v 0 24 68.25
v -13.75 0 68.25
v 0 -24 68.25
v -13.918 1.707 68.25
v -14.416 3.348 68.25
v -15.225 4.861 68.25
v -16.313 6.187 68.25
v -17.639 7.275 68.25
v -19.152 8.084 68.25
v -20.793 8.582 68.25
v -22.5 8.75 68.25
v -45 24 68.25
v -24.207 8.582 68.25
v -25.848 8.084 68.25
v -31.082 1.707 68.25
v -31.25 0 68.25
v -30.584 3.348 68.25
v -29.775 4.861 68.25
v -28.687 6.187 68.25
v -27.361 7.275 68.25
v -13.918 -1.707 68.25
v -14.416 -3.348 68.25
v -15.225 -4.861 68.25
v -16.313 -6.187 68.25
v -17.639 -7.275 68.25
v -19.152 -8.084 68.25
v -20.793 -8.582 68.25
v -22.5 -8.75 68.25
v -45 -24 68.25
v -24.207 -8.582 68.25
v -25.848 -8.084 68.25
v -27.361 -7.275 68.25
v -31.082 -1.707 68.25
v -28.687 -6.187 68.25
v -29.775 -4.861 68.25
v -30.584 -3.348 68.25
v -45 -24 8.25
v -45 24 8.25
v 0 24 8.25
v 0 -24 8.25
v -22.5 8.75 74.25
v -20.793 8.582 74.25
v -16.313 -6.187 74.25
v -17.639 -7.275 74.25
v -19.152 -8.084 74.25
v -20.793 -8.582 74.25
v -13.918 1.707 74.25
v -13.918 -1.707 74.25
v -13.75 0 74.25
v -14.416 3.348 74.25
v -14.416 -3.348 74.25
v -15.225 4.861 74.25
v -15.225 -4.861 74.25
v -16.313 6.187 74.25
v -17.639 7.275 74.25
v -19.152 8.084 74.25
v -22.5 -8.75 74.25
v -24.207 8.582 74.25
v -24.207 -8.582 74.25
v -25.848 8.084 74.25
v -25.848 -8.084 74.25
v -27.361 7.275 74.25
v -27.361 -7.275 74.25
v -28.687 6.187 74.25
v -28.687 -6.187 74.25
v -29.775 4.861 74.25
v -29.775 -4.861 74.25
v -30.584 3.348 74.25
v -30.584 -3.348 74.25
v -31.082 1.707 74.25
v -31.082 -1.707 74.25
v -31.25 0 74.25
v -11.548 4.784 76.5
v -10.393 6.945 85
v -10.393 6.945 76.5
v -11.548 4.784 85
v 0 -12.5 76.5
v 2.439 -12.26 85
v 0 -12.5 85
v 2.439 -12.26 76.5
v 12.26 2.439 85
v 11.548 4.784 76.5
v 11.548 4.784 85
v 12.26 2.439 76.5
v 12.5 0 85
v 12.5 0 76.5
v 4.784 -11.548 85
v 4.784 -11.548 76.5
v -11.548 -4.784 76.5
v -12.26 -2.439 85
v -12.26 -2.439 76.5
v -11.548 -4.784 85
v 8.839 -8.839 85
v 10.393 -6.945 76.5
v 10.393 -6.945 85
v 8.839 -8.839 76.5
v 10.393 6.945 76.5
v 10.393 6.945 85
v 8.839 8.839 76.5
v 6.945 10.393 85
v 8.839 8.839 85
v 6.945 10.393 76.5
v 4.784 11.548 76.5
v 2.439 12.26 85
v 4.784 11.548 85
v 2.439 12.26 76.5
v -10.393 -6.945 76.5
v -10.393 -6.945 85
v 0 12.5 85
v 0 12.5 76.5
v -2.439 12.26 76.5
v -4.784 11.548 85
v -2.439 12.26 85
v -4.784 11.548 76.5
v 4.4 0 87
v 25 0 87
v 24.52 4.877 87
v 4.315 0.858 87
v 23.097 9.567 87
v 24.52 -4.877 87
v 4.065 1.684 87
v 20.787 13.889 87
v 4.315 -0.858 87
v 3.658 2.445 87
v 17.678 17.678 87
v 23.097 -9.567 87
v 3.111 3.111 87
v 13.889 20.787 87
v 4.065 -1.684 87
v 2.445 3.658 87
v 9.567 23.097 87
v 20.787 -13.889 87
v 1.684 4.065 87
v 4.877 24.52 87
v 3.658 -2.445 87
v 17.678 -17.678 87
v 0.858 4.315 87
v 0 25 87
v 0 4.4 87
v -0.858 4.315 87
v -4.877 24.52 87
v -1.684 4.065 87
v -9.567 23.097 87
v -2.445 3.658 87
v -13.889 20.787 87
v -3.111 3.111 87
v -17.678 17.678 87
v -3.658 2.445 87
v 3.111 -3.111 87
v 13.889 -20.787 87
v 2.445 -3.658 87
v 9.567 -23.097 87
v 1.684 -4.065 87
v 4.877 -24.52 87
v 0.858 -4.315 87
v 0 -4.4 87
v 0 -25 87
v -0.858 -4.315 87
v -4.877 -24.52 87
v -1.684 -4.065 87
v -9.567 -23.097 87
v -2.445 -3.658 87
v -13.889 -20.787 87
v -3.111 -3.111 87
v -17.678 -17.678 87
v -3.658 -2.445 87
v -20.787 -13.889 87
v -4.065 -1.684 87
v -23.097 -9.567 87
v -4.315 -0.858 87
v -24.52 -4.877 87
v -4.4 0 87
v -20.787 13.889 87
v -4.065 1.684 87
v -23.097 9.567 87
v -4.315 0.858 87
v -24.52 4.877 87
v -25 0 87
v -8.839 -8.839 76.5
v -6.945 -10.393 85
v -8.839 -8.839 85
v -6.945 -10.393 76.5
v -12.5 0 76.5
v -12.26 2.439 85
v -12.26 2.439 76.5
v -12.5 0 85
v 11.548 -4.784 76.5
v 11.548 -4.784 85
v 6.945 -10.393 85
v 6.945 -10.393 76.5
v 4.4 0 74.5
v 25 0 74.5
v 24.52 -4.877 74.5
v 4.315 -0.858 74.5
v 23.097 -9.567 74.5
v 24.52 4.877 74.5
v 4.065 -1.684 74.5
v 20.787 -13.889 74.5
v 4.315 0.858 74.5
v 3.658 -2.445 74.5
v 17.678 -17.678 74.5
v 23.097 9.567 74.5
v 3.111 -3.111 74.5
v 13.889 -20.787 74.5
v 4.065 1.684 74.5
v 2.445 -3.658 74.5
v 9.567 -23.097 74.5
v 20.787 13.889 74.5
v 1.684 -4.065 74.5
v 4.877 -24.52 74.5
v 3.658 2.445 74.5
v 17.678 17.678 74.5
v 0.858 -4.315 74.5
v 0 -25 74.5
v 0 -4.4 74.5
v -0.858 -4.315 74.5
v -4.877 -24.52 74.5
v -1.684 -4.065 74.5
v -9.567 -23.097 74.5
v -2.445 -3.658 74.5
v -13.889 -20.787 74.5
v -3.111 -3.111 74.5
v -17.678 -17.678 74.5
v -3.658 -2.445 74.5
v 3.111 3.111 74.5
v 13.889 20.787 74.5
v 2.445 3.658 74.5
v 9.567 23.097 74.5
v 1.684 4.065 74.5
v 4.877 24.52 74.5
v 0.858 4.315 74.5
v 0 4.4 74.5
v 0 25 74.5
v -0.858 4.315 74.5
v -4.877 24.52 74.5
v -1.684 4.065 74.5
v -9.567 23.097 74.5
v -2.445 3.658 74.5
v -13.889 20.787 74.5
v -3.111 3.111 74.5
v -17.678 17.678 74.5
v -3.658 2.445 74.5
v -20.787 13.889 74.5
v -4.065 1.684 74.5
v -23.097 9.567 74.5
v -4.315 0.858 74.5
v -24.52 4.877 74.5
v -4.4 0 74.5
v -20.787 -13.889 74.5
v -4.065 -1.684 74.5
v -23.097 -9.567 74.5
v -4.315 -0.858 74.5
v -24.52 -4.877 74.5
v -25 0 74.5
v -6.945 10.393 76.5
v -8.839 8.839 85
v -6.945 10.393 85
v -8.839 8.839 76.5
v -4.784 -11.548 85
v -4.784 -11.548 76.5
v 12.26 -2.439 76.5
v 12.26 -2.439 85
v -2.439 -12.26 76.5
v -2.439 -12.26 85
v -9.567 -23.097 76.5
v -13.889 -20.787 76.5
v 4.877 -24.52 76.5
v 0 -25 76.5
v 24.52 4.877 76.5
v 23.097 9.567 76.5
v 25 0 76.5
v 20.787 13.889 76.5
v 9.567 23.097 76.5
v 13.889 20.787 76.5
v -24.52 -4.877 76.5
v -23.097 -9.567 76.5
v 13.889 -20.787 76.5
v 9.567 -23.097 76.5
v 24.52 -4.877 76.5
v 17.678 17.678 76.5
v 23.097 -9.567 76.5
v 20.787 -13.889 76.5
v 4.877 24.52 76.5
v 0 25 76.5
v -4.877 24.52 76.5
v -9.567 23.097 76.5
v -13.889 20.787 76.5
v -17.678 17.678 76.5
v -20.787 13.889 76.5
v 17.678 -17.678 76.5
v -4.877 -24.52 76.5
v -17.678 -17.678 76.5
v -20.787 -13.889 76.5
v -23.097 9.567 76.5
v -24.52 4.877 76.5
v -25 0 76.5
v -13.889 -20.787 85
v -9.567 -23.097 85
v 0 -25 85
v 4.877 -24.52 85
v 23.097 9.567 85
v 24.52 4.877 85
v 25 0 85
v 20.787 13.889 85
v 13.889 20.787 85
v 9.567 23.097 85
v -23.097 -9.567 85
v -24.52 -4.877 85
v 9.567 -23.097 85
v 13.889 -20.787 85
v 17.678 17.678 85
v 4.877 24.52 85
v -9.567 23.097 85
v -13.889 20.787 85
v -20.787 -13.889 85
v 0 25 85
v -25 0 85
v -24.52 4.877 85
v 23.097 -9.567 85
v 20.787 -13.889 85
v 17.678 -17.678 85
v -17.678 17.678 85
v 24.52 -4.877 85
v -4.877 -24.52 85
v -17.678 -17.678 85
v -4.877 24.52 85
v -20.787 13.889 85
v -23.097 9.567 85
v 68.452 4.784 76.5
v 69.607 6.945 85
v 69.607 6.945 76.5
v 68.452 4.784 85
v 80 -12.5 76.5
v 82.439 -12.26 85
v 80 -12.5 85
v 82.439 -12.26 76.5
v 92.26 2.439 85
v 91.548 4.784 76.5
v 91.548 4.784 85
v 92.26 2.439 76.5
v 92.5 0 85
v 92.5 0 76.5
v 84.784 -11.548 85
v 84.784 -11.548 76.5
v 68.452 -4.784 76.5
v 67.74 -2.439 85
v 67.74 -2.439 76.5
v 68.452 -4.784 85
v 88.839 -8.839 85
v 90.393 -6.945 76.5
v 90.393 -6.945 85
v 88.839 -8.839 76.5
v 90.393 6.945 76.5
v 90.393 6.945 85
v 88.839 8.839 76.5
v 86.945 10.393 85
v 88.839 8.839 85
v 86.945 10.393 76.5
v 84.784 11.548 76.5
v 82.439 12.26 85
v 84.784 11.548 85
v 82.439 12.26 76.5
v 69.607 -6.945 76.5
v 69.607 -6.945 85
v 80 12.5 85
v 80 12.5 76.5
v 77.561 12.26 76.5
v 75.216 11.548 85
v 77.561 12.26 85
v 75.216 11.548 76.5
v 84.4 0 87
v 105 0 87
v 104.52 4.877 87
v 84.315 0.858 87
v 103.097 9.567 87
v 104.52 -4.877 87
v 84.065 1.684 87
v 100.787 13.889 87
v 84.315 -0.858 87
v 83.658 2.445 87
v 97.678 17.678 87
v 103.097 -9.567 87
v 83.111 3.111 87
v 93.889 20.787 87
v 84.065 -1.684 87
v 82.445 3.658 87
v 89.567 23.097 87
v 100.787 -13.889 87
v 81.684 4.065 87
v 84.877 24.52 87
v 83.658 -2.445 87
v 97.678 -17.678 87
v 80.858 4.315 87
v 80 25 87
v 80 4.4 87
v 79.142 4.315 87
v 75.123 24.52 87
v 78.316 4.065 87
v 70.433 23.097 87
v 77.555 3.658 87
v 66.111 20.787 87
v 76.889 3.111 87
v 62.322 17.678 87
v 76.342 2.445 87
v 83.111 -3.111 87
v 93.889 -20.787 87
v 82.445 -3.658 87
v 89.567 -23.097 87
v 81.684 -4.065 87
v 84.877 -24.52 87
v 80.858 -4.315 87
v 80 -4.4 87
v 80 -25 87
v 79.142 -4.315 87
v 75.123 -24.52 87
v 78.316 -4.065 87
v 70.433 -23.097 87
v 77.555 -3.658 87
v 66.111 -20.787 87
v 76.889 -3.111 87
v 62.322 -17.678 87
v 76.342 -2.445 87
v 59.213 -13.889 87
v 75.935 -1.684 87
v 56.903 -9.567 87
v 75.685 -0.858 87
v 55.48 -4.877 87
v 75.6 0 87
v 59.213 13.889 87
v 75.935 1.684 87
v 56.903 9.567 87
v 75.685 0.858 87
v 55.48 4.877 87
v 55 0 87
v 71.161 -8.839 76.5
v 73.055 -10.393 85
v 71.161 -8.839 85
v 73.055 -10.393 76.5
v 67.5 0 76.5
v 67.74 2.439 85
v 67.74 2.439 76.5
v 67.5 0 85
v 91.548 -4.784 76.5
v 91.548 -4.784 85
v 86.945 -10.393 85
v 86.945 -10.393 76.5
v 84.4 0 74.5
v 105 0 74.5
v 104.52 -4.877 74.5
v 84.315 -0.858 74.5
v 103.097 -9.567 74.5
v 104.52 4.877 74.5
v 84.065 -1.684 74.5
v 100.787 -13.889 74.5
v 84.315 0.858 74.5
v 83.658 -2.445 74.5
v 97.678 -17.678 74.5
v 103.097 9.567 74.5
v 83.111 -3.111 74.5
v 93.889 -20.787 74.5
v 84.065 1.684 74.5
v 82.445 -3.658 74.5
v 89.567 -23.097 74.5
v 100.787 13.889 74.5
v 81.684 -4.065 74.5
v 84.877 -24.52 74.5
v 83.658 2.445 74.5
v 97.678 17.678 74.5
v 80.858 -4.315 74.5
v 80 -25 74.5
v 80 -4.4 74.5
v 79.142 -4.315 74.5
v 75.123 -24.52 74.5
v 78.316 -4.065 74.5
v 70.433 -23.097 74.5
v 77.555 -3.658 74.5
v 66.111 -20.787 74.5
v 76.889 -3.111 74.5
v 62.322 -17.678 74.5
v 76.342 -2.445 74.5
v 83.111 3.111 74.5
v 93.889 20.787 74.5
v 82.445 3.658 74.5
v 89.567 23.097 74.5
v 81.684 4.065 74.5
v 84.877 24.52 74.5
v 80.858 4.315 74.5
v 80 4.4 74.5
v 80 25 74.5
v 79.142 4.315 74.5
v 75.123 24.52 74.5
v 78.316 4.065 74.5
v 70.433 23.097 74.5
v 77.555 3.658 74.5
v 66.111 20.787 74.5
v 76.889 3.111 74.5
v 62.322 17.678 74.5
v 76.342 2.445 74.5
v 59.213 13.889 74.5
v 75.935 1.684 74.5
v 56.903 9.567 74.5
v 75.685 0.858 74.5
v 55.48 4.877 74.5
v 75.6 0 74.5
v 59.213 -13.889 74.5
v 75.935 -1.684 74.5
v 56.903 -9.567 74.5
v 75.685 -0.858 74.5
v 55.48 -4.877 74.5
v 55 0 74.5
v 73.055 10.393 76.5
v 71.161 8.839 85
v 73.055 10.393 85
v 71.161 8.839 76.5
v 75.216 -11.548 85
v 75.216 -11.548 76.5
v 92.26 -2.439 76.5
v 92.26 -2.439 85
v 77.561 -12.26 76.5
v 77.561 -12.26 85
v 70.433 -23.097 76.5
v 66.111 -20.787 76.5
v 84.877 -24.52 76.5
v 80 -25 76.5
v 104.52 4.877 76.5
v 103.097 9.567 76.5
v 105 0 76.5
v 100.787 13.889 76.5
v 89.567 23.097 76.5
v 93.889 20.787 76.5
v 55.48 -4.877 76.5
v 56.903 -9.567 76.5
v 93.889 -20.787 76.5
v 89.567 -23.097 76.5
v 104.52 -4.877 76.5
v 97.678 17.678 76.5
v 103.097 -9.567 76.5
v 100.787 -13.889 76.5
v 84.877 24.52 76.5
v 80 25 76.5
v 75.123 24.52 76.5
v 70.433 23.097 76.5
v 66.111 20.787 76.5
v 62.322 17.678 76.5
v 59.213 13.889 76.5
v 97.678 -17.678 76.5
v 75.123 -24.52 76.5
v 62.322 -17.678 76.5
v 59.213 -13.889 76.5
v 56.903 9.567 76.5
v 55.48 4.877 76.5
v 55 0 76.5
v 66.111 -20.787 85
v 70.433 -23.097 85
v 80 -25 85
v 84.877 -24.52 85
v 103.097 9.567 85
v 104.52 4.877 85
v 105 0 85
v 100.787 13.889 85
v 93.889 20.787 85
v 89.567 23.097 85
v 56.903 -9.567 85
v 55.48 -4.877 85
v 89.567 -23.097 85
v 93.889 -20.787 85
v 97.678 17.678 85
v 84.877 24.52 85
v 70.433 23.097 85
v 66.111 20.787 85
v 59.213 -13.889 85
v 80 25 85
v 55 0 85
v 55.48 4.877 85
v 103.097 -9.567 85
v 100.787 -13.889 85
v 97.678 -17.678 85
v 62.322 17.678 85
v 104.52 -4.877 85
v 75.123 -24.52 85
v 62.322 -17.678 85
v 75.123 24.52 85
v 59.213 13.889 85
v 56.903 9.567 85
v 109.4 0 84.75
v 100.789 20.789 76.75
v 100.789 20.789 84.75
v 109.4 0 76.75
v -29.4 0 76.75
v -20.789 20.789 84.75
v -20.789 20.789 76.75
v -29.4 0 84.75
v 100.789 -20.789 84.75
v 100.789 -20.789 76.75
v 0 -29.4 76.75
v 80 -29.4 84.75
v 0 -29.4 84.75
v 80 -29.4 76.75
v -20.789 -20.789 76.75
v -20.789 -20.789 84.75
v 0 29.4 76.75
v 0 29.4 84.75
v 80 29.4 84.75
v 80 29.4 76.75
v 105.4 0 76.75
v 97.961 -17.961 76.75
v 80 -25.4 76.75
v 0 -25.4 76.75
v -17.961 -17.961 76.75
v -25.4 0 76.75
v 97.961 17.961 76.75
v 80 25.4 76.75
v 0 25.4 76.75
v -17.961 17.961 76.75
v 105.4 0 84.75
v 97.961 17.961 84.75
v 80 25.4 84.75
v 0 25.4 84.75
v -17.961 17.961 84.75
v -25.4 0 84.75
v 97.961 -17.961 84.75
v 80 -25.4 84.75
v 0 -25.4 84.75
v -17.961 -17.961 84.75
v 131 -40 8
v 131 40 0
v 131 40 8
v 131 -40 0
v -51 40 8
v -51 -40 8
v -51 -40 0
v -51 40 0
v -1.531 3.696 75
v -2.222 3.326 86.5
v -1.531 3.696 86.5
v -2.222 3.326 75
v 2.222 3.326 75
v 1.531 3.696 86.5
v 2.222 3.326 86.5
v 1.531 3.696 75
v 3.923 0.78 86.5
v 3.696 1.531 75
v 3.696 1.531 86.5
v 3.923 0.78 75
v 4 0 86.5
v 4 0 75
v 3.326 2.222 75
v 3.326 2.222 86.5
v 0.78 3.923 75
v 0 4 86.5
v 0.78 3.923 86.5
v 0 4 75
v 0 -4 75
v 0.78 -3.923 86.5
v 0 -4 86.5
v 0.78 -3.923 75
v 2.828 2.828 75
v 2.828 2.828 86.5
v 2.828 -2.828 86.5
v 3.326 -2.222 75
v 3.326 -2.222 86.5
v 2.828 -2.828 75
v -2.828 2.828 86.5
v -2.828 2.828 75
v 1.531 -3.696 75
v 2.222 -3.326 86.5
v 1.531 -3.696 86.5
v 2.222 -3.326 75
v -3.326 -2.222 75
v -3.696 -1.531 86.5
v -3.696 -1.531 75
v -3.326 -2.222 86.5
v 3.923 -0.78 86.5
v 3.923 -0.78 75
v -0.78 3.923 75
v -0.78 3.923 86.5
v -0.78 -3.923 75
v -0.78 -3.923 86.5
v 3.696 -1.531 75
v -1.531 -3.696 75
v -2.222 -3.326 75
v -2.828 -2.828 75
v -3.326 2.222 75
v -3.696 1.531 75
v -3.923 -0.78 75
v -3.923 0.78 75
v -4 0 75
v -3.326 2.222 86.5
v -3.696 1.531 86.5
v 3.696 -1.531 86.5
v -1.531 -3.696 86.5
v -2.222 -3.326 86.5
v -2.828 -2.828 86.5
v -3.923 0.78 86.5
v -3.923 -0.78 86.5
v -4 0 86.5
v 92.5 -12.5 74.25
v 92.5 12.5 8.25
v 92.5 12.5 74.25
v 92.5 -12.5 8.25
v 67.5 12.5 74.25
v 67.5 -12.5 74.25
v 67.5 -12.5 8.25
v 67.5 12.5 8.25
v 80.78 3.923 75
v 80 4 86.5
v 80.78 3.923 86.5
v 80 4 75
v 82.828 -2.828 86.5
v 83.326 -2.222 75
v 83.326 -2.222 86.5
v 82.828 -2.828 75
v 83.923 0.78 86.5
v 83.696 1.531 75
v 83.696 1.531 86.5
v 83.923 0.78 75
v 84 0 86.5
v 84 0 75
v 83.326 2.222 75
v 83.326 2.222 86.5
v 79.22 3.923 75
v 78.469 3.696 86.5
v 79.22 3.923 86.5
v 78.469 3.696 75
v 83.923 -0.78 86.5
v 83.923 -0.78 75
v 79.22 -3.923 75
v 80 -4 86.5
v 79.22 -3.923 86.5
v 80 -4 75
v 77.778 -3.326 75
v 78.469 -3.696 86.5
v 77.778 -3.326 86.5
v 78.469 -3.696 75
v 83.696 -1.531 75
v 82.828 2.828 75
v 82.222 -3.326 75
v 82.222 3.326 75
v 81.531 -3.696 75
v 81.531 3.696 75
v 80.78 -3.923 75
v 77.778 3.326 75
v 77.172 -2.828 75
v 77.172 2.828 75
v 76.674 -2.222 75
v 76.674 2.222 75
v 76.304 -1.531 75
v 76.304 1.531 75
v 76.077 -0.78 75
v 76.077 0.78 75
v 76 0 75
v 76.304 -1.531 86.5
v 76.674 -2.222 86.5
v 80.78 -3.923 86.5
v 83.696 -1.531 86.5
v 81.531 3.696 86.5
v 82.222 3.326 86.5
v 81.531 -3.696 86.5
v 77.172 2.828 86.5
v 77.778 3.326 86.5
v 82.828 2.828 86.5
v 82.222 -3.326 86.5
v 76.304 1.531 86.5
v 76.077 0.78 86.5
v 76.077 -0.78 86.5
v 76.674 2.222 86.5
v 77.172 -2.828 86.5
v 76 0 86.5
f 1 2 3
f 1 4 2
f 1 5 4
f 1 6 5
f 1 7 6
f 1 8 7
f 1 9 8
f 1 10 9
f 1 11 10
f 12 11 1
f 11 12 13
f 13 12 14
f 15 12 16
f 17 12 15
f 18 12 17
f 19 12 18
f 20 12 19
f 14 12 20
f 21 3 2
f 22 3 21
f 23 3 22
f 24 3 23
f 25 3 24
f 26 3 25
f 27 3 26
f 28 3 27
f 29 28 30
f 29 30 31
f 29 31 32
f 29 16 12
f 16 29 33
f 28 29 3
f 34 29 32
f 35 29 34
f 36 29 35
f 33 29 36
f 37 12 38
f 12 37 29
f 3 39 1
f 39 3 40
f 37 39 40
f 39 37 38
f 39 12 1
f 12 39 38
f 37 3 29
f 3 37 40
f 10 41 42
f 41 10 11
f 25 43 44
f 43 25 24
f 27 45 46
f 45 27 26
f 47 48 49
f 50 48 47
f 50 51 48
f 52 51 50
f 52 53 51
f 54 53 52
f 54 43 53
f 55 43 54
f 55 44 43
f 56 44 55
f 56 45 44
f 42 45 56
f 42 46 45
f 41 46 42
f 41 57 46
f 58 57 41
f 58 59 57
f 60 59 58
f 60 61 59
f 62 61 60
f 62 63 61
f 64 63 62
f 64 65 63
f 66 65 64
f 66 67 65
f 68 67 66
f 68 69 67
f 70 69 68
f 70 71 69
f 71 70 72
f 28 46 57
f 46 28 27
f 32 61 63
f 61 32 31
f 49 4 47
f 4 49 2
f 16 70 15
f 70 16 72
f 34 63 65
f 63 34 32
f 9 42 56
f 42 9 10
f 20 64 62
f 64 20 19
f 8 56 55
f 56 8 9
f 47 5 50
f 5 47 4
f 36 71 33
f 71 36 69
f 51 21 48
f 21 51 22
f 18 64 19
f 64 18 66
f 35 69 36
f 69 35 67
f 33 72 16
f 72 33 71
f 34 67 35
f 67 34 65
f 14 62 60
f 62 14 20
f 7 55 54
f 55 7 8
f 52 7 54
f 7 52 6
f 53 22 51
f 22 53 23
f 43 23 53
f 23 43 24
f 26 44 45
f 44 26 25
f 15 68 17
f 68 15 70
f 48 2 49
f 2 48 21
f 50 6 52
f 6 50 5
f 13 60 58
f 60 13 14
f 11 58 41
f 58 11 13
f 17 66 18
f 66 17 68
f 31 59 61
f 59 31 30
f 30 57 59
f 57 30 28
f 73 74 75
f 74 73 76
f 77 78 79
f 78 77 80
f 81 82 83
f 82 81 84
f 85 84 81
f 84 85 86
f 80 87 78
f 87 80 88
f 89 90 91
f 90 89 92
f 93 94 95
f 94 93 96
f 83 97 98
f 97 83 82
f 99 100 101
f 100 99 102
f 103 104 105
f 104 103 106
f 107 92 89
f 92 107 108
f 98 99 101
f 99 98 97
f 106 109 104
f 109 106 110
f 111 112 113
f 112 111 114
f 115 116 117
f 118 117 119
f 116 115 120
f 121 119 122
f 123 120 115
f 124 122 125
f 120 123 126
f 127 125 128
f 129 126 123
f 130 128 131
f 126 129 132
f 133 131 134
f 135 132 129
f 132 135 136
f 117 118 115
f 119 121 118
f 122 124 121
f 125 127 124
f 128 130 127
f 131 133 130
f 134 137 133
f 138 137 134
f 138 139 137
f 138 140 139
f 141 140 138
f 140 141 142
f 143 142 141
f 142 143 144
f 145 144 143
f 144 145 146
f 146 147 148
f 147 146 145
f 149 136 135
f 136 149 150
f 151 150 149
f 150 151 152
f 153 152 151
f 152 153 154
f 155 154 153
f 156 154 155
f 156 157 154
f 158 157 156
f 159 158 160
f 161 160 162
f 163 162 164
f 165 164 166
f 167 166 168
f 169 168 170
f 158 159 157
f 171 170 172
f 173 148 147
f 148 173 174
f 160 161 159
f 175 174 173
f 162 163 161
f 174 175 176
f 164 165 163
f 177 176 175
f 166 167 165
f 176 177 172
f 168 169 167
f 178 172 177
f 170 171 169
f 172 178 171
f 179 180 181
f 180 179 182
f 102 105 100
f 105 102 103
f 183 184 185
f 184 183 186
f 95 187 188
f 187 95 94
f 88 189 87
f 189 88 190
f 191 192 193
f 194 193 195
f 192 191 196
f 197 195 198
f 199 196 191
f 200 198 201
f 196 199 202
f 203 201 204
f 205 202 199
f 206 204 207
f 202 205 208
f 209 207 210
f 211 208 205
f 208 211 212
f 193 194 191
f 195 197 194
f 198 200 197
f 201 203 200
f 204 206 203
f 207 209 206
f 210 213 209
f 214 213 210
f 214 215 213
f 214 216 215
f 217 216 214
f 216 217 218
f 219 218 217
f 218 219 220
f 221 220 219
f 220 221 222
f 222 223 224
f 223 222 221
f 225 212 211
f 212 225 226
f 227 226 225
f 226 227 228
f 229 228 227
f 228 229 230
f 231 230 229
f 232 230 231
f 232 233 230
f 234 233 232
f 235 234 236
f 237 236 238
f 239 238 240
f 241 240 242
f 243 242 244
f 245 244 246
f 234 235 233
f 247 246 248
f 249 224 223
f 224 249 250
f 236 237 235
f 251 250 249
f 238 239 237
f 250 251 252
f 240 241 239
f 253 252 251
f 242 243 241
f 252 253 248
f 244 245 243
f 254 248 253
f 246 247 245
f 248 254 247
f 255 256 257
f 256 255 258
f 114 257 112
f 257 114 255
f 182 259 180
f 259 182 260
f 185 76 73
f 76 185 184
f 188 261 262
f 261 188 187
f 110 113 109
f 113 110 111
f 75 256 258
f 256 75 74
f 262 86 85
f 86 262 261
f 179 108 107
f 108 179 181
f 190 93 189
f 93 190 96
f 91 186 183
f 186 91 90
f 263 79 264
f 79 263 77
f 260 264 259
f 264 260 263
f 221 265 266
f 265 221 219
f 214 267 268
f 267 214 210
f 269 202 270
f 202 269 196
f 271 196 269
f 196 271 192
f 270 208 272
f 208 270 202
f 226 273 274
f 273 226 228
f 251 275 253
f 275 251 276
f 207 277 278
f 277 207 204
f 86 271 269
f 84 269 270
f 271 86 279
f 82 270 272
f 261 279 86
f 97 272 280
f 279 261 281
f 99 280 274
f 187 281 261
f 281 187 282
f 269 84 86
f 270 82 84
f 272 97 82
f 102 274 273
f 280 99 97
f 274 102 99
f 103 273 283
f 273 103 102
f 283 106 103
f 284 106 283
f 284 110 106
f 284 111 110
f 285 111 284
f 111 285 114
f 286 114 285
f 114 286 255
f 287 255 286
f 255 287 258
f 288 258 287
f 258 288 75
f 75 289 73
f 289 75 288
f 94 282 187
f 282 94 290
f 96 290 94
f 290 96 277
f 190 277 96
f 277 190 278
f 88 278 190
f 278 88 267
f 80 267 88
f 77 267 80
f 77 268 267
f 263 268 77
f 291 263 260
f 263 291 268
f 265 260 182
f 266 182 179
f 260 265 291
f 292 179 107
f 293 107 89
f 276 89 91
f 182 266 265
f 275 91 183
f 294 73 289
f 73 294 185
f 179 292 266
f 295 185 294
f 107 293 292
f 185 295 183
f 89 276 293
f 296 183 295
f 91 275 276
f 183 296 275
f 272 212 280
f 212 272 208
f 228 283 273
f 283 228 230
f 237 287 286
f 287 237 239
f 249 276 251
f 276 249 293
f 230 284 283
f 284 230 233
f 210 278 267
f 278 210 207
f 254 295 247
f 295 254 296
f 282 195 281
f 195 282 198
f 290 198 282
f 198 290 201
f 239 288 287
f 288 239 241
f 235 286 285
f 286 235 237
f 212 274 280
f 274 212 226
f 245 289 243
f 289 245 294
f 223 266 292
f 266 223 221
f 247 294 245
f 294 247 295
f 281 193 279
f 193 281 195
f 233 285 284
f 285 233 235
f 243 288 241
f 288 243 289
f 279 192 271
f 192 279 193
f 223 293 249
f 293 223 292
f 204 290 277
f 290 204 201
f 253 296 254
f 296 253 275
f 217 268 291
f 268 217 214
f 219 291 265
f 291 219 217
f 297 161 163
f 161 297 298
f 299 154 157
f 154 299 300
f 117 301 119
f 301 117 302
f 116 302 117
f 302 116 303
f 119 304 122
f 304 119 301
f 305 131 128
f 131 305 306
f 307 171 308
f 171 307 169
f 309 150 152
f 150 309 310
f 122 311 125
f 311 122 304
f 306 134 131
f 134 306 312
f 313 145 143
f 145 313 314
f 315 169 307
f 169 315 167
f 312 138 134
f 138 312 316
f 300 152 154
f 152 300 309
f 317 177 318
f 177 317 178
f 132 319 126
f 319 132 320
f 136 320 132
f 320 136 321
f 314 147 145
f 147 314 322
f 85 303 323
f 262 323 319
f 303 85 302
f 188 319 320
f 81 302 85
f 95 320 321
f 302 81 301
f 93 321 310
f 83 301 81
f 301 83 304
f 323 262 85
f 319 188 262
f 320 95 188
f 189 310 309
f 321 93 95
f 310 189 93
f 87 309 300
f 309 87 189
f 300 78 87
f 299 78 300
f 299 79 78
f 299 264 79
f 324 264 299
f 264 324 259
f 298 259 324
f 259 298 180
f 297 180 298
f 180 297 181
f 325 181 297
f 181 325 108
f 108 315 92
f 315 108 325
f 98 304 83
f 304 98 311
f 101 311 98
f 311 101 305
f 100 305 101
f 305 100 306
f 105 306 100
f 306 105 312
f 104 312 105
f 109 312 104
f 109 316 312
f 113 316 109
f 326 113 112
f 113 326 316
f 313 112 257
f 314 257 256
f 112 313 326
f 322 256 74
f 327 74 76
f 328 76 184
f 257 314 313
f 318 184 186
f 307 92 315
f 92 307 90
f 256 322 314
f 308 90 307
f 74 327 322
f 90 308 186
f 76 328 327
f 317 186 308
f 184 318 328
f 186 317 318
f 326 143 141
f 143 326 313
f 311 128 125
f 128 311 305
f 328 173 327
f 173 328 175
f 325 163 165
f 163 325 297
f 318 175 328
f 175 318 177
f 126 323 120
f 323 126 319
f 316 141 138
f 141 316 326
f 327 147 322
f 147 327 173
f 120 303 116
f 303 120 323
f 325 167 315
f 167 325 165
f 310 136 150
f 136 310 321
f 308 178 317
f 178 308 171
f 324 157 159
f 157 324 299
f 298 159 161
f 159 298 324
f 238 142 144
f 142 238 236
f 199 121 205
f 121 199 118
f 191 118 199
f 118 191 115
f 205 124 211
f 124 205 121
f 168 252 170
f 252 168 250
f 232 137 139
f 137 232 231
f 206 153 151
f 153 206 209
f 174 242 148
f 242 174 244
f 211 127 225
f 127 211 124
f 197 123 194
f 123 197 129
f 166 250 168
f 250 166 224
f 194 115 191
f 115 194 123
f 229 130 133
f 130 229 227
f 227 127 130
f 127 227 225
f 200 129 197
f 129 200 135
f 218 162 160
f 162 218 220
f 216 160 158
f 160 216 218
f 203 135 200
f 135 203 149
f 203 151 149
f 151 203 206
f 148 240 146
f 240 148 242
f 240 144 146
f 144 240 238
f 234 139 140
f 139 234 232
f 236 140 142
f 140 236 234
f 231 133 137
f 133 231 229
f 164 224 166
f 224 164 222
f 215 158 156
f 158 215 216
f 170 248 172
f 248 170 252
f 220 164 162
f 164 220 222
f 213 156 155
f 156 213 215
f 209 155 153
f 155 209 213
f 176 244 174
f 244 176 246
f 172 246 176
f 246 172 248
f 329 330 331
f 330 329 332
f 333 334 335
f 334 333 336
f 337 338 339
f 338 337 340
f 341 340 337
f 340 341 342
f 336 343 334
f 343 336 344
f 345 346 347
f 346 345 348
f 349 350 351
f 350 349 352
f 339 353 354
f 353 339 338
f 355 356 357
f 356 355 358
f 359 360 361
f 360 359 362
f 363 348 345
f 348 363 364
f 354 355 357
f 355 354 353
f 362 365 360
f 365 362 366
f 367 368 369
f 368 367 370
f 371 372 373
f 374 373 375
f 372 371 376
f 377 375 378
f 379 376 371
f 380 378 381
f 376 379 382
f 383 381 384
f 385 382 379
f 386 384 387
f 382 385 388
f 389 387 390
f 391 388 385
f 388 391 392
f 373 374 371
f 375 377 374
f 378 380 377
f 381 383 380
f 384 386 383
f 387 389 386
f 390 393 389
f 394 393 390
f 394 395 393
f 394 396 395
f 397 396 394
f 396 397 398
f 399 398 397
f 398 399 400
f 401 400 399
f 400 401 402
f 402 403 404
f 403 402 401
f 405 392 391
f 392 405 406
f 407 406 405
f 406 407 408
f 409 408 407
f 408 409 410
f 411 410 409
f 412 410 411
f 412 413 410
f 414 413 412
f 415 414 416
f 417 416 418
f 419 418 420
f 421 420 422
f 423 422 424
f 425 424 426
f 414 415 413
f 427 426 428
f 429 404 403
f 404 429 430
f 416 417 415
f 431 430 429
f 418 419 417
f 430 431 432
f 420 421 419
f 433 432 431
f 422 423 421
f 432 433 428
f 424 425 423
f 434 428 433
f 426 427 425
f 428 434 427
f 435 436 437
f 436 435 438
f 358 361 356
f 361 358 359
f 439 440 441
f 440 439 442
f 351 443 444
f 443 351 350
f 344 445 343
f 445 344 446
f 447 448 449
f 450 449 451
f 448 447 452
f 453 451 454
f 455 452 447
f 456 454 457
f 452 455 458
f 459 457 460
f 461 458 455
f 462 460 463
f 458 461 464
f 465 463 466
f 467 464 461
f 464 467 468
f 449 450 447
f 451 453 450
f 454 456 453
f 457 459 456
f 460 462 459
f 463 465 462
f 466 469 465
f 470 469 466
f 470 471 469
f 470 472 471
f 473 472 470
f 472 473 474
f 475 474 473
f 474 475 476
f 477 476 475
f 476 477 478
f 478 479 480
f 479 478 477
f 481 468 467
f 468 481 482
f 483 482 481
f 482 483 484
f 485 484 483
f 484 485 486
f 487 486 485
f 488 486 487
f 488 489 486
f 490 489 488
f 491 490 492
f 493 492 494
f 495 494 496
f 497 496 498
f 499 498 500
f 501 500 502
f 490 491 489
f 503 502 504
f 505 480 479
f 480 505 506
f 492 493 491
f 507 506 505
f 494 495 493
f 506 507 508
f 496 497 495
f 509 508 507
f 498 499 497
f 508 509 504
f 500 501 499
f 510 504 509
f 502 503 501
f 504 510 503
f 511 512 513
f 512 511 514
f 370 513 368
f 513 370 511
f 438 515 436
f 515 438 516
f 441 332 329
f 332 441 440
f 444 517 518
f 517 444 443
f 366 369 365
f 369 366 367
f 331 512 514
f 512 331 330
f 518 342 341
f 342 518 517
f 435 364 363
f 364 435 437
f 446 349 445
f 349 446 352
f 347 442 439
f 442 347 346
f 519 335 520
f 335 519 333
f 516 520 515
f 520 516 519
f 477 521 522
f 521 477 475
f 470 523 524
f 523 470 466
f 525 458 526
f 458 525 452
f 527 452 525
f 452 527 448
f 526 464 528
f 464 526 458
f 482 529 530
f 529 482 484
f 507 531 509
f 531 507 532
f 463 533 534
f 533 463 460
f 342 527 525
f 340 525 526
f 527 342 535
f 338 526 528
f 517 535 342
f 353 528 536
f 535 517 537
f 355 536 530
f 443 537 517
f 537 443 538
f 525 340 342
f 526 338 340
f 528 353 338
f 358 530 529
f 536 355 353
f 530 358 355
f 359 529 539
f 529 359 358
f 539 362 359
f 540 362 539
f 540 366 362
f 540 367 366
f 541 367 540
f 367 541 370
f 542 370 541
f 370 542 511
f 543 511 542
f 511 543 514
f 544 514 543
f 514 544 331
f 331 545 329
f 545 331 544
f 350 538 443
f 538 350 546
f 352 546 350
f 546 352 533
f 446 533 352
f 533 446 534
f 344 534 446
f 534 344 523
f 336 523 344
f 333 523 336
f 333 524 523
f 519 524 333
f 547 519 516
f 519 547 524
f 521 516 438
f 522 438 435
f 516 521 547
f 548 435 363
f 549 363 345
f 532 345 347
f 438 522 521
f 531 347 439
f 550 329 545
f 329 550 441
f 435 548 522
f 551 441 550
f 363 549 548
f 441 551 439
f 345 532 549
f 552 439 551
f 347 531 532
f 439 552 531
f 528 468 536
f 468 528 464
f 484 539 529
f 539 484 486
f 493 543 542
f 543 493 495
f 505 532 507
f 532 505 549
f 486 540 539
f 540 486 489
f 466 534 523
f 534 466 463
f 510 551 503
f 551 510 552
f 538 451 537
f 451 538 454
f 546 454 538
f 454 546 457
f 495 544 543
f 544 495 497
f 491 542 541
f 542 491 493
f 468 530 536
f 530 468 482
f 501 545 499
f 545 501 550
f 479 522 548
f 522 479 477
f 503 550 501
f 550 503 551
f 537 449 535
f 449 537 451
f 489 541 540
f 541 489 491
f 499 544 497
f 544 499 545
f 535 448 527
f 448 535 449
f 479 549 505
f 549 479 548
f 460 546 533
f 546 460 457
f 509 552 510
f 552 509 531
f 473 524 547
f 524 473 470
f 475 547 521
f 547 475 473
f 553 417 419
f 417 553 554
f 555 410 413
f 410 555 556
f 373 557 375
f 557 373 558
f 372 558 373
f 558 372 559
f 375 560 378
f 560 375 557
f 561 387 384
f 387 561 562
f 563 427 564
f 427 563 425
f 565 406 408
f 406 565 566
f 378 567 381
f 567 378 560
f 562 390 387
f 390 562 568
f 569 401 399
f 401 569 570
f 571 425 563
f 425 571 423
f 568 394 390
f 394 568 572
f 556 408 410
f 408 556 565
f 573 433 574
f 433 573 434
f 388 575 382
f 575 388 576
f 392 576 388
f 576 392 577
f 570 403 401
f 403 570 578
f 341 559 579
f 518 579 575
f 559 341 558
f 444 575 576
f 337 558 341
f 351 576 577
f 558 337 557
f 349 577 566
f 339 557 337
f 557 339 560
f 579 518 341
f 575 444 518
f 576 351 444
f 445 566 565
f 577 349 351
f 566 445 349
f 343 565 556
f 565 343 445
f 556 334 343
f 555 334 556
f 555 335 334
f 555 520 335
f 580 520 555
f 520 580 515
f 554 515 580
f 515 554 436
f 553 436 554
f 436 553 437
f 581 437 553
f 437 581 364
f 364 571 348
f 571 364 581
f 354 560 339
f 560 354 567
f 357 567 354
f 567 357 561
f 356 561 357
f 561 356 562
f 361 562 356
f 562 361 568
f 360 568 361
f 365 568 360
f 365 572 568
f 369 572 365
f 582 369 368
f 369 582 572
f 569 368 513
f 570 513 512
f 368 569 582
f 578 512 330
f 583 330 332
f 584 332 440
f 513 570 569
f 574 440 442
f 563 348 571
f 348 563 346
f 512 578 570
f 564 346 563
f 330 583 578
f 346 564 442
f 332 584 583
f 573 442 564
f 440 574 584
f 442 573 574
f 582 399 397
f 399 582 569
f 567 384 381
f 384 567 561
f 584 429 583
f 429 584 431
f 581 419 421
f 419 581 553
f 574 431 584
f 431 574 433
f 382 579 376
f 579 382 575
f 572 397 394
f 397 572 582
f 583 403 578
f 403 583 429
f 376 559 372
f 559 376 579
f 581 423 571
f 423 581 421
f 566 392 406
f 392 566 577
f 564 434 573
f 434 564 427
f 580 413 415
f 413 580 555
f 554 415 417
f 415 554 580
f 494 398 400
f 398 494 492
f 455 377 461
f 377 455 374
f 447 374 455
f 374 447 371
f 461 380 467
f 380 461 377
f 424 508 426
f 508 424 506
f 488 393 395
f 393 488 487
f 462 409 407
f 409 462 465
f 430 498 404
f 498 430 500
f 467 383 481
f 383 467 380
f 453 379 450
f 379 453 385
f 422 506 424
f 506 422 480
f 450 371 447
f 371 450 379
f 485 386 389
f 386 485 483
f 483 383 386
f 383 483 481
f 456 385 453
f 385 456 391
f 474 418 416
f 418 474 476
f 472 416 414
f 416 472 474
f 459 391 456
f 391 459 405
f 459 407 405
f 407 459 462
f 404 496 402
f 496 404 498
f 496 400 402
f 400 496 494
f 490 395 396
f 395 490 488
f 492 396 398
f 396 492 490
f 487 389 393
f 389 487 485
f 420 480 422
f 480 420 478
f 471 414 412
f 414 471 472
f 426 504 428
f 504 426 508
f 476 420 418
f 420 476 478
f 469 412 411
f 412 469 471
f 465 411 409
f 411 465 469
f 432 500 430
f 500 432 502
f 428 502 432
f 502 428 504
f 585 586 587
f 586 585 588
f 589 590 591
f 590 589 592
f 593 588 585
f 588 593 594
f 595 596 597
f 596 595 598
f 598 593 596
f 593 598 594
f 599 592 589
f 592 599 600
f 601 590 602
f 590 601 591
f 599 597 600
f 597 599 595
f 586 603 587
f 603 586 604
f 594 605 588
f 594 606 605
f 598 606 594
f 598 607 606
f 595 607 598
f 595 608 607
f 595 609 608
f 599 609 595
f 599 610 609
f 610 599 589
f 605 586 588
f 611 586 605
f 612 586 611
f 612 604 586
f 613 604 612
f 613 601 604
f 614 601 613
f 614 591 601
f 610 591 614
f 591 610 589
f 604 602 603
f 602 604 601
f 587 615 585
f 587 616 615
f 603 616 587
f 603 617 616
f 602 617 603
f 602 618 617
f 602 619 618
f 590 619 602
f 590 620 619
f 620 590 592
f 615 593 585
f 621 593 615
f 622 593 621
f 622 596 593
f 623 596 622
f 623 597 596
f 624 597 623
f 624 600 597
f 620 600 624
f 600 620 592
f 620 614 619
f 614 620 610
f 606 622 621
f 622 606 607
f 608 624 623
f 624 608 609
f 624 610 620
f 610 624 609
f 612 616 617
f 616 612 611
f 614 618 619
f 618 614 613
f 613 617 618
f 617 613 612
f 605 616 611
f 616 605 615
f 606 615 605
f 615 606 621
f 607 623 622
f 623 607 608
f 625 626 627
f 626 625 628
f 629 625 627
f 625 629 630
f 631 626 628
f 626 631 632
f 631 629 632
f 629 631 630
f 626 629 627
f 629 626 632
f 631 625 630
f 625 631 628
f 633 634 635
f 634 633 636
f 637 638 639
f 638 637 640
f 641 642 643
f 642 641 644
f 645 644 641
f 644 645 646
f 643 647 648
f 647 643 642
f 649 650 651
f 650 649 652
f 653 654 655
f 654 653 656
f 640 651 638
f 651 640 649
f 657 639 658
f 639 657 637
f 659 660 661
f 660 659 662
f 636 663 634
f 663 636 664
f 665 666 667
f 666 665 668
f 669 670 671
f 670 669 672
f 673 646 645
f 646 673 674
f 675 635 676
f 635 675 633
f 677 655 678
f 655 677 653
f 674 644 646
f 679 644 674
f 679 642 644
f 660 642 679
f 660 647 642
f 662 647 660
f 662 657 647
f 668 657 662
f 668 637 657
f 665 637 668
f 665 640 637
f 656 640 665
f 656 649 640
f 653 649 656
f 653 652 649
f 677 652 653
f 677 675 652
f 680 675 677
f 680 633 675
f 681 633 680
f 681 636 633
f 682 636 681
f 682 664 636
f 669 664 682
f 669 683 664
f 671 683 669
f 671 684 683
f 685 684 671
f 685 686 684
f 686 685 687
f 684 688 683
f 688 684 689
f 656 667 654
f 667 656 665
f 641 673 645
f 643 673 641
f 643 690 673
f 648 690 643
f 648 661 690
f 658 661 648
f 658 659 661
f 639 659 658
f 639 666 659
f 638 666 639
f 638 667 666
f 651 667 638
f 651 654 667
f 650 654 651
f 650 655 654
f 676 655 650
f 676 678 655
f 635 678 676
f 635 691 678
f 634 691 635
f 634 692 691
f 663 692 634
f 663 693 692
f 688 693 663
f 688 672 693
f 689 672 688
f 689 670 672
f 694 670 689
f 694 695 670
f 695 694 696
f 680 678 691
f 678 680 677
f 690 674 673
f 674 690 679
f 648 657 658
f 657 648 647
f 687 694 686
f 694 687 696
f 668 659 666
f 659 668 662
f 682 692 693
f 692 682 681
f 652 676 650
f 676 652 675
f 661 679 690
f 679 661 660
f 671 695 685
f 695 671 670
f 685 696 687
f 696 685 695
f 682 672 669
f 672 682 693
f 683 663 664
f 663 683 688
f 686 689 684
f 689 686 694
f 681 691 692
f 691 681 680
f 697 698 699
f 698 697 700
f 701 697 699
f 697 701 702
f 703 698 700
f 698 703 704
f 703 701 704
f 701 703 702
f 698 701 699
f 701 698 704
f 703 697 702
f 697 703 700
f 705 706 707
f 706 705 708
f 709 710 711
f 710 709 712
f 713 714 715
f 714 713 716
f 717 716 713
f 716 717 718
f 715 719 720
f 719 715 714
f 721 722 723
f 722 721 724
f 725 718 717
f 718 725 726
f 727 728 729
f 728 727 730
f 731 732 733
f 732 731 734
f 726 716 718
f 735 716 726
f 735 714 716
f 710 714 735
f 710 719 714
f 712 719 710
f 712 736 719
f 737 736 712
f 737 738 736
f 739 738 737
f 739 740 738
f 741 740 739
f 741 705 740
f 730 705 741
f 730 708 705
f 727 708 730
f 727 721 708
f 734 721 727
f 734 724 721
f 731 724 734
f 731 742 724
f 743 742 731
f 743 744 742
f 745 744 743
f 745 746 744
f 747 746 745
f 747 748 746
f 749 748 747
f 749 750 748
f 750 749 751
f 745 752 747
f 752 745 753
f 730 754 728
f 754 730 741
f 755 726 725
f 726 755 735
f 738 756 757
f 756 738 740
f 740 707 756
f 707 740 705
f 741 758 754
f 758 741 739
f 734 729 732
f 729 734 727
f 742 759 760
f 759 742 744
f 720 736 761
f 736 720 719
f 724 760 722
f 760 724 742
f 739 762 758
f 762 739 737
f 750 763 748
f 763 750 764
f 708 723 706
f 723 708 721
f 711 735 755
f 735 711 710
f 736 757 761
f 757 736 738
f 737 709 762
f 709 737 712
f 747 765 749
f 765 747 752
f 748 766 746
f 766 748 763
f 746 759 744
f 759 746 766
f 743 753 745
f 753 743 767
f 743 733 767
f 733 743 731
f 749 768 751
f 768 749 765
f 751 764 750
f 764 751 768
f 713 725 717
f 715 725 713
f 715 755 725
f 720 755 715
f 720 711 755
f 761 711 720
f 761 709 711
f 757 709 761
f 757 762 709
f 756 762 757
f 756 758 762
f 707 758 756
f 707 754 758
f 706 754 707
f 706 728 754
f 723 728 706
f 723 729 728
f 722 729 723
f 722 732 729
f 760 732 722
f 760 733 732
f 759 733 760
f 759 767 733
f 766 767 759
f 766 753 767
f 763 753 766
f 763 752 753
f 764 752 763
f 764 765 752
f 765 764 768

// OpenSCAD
$fn = 32;

// ------------------------------------------------------------------------
// Motor belt drive: span 80 mm, pulleys d50, belt 8 mm wide
// Every part is its own module, assembly() places every instance.
// ------------------------------------------------------------------------

// --- part 1 ---
module base_plate() {
  difference() {
    translate([-91, -40, 0]) cube([182, 80, 8]);
  }
}

// --- part 2 ---
module motor() {
  union() {
    translate([-30, -24, 0]) cube([60, 48, 45]);
    translate([33, 0, 22.5]) rotate([0, 90, 0]) cylinder(h = 6, d = 17.5, center = true);
  }
}

// --- part 3 ---
module drive_shaft() {
  translate([0, 0, -5.75]) cylinder(h = 11.5, d = 8);
}

// --- part 4 ---
module pulley_drive() {
  difference() {
    union() {
      cylinder(h = 12.5, d = 25);
      cylinder(h = 2, d = 50);
      translate([0, 0, 10.5]) cylinder(h = 2, d = 50);
    }
    translate([0, 0, -1]) cylinder(h = 14.5, d = 8.8);
  }
}

// --- part 5 ---
module idler_post() {
  translate([-12.5, -12.5, 0]) cube([25, 25, 66]);
}

// --- part 6 ---
module driven_shaft() {
  translate([0, 0, -5.75]) cylinder(h = 11.5, d = 8);
}

// --- part 7 ---
module pulley_driven() {
  difference() {
    union() {
      cylinder(h = 12.5, d = 25);
      cylinder(h = 2, d = 50);
      translate([0, 0, 10.5]) cylinder(h = 2, d = 50);
    }
    translate([0, 0, -1]) cylinder(h = 14.5, d = 8.8);
  }
}

// --- part 8 ---
module drive_belt() {
  difference() {
    linear_extrude(height = 8) polygon(points = concat([for (a = [90 : 45 : 270]) [29.4 * cos(a), 29.4 * sin(a)]], [for (a = [270 : 45 : 450]) [80 + 29.4 * cos(a), 29.4 * sin(a)]]));
    translate([0, 0, -1]) linear_extrude(height = 10) polygon(points = concat([for (a = [90 : 45 : 270]) [25.4 * cos(a), 25.4 * sin(a)]], [for (a = [270 : 45 : 450]) [80 + 25.4 * cos(a), 25.4 * sin(a)]]));
  }
}

// --- assembly ---
module assembly() {
  color([0.80, 0.24, 0.20]) translate([40, 0, 0]) rotate([0, 0, 0]) base_plate();
  color([0.20, 0.45, 0.75]) translate([0, 0, 38.25]) rotate([0, 270, 0]) motor();
  color([0.25, 0.62, 0.32]) translate([0, 0, 80.75]) rotate([0, 0, 0]) drive_shaft();
  color([0.92, 0.70, 0.18]) translate([0, 0, 74.5]) rotate([0, 0, 0]) pulley_drive();
  color([0.58, 0.35, 0.70]) translate([80, 0, 8.25]) rotate([0, 0, 0]) idler_post();
  color([0.16, 0.66, 0.66]) translate([80, 0, 80.75]) rotate([0, 0, 0]) driven_shaft();
  color([0.85, 0.48, 0.18]) translate([80, 0, 74.5]) rotate([0, 0, 0]) pulley_driven();
  color([0.55, 0.60, 0.65]) translate([0, 0, 76.75]) rotate([0, 0, 0]) drive_belt();
}

assembly();
